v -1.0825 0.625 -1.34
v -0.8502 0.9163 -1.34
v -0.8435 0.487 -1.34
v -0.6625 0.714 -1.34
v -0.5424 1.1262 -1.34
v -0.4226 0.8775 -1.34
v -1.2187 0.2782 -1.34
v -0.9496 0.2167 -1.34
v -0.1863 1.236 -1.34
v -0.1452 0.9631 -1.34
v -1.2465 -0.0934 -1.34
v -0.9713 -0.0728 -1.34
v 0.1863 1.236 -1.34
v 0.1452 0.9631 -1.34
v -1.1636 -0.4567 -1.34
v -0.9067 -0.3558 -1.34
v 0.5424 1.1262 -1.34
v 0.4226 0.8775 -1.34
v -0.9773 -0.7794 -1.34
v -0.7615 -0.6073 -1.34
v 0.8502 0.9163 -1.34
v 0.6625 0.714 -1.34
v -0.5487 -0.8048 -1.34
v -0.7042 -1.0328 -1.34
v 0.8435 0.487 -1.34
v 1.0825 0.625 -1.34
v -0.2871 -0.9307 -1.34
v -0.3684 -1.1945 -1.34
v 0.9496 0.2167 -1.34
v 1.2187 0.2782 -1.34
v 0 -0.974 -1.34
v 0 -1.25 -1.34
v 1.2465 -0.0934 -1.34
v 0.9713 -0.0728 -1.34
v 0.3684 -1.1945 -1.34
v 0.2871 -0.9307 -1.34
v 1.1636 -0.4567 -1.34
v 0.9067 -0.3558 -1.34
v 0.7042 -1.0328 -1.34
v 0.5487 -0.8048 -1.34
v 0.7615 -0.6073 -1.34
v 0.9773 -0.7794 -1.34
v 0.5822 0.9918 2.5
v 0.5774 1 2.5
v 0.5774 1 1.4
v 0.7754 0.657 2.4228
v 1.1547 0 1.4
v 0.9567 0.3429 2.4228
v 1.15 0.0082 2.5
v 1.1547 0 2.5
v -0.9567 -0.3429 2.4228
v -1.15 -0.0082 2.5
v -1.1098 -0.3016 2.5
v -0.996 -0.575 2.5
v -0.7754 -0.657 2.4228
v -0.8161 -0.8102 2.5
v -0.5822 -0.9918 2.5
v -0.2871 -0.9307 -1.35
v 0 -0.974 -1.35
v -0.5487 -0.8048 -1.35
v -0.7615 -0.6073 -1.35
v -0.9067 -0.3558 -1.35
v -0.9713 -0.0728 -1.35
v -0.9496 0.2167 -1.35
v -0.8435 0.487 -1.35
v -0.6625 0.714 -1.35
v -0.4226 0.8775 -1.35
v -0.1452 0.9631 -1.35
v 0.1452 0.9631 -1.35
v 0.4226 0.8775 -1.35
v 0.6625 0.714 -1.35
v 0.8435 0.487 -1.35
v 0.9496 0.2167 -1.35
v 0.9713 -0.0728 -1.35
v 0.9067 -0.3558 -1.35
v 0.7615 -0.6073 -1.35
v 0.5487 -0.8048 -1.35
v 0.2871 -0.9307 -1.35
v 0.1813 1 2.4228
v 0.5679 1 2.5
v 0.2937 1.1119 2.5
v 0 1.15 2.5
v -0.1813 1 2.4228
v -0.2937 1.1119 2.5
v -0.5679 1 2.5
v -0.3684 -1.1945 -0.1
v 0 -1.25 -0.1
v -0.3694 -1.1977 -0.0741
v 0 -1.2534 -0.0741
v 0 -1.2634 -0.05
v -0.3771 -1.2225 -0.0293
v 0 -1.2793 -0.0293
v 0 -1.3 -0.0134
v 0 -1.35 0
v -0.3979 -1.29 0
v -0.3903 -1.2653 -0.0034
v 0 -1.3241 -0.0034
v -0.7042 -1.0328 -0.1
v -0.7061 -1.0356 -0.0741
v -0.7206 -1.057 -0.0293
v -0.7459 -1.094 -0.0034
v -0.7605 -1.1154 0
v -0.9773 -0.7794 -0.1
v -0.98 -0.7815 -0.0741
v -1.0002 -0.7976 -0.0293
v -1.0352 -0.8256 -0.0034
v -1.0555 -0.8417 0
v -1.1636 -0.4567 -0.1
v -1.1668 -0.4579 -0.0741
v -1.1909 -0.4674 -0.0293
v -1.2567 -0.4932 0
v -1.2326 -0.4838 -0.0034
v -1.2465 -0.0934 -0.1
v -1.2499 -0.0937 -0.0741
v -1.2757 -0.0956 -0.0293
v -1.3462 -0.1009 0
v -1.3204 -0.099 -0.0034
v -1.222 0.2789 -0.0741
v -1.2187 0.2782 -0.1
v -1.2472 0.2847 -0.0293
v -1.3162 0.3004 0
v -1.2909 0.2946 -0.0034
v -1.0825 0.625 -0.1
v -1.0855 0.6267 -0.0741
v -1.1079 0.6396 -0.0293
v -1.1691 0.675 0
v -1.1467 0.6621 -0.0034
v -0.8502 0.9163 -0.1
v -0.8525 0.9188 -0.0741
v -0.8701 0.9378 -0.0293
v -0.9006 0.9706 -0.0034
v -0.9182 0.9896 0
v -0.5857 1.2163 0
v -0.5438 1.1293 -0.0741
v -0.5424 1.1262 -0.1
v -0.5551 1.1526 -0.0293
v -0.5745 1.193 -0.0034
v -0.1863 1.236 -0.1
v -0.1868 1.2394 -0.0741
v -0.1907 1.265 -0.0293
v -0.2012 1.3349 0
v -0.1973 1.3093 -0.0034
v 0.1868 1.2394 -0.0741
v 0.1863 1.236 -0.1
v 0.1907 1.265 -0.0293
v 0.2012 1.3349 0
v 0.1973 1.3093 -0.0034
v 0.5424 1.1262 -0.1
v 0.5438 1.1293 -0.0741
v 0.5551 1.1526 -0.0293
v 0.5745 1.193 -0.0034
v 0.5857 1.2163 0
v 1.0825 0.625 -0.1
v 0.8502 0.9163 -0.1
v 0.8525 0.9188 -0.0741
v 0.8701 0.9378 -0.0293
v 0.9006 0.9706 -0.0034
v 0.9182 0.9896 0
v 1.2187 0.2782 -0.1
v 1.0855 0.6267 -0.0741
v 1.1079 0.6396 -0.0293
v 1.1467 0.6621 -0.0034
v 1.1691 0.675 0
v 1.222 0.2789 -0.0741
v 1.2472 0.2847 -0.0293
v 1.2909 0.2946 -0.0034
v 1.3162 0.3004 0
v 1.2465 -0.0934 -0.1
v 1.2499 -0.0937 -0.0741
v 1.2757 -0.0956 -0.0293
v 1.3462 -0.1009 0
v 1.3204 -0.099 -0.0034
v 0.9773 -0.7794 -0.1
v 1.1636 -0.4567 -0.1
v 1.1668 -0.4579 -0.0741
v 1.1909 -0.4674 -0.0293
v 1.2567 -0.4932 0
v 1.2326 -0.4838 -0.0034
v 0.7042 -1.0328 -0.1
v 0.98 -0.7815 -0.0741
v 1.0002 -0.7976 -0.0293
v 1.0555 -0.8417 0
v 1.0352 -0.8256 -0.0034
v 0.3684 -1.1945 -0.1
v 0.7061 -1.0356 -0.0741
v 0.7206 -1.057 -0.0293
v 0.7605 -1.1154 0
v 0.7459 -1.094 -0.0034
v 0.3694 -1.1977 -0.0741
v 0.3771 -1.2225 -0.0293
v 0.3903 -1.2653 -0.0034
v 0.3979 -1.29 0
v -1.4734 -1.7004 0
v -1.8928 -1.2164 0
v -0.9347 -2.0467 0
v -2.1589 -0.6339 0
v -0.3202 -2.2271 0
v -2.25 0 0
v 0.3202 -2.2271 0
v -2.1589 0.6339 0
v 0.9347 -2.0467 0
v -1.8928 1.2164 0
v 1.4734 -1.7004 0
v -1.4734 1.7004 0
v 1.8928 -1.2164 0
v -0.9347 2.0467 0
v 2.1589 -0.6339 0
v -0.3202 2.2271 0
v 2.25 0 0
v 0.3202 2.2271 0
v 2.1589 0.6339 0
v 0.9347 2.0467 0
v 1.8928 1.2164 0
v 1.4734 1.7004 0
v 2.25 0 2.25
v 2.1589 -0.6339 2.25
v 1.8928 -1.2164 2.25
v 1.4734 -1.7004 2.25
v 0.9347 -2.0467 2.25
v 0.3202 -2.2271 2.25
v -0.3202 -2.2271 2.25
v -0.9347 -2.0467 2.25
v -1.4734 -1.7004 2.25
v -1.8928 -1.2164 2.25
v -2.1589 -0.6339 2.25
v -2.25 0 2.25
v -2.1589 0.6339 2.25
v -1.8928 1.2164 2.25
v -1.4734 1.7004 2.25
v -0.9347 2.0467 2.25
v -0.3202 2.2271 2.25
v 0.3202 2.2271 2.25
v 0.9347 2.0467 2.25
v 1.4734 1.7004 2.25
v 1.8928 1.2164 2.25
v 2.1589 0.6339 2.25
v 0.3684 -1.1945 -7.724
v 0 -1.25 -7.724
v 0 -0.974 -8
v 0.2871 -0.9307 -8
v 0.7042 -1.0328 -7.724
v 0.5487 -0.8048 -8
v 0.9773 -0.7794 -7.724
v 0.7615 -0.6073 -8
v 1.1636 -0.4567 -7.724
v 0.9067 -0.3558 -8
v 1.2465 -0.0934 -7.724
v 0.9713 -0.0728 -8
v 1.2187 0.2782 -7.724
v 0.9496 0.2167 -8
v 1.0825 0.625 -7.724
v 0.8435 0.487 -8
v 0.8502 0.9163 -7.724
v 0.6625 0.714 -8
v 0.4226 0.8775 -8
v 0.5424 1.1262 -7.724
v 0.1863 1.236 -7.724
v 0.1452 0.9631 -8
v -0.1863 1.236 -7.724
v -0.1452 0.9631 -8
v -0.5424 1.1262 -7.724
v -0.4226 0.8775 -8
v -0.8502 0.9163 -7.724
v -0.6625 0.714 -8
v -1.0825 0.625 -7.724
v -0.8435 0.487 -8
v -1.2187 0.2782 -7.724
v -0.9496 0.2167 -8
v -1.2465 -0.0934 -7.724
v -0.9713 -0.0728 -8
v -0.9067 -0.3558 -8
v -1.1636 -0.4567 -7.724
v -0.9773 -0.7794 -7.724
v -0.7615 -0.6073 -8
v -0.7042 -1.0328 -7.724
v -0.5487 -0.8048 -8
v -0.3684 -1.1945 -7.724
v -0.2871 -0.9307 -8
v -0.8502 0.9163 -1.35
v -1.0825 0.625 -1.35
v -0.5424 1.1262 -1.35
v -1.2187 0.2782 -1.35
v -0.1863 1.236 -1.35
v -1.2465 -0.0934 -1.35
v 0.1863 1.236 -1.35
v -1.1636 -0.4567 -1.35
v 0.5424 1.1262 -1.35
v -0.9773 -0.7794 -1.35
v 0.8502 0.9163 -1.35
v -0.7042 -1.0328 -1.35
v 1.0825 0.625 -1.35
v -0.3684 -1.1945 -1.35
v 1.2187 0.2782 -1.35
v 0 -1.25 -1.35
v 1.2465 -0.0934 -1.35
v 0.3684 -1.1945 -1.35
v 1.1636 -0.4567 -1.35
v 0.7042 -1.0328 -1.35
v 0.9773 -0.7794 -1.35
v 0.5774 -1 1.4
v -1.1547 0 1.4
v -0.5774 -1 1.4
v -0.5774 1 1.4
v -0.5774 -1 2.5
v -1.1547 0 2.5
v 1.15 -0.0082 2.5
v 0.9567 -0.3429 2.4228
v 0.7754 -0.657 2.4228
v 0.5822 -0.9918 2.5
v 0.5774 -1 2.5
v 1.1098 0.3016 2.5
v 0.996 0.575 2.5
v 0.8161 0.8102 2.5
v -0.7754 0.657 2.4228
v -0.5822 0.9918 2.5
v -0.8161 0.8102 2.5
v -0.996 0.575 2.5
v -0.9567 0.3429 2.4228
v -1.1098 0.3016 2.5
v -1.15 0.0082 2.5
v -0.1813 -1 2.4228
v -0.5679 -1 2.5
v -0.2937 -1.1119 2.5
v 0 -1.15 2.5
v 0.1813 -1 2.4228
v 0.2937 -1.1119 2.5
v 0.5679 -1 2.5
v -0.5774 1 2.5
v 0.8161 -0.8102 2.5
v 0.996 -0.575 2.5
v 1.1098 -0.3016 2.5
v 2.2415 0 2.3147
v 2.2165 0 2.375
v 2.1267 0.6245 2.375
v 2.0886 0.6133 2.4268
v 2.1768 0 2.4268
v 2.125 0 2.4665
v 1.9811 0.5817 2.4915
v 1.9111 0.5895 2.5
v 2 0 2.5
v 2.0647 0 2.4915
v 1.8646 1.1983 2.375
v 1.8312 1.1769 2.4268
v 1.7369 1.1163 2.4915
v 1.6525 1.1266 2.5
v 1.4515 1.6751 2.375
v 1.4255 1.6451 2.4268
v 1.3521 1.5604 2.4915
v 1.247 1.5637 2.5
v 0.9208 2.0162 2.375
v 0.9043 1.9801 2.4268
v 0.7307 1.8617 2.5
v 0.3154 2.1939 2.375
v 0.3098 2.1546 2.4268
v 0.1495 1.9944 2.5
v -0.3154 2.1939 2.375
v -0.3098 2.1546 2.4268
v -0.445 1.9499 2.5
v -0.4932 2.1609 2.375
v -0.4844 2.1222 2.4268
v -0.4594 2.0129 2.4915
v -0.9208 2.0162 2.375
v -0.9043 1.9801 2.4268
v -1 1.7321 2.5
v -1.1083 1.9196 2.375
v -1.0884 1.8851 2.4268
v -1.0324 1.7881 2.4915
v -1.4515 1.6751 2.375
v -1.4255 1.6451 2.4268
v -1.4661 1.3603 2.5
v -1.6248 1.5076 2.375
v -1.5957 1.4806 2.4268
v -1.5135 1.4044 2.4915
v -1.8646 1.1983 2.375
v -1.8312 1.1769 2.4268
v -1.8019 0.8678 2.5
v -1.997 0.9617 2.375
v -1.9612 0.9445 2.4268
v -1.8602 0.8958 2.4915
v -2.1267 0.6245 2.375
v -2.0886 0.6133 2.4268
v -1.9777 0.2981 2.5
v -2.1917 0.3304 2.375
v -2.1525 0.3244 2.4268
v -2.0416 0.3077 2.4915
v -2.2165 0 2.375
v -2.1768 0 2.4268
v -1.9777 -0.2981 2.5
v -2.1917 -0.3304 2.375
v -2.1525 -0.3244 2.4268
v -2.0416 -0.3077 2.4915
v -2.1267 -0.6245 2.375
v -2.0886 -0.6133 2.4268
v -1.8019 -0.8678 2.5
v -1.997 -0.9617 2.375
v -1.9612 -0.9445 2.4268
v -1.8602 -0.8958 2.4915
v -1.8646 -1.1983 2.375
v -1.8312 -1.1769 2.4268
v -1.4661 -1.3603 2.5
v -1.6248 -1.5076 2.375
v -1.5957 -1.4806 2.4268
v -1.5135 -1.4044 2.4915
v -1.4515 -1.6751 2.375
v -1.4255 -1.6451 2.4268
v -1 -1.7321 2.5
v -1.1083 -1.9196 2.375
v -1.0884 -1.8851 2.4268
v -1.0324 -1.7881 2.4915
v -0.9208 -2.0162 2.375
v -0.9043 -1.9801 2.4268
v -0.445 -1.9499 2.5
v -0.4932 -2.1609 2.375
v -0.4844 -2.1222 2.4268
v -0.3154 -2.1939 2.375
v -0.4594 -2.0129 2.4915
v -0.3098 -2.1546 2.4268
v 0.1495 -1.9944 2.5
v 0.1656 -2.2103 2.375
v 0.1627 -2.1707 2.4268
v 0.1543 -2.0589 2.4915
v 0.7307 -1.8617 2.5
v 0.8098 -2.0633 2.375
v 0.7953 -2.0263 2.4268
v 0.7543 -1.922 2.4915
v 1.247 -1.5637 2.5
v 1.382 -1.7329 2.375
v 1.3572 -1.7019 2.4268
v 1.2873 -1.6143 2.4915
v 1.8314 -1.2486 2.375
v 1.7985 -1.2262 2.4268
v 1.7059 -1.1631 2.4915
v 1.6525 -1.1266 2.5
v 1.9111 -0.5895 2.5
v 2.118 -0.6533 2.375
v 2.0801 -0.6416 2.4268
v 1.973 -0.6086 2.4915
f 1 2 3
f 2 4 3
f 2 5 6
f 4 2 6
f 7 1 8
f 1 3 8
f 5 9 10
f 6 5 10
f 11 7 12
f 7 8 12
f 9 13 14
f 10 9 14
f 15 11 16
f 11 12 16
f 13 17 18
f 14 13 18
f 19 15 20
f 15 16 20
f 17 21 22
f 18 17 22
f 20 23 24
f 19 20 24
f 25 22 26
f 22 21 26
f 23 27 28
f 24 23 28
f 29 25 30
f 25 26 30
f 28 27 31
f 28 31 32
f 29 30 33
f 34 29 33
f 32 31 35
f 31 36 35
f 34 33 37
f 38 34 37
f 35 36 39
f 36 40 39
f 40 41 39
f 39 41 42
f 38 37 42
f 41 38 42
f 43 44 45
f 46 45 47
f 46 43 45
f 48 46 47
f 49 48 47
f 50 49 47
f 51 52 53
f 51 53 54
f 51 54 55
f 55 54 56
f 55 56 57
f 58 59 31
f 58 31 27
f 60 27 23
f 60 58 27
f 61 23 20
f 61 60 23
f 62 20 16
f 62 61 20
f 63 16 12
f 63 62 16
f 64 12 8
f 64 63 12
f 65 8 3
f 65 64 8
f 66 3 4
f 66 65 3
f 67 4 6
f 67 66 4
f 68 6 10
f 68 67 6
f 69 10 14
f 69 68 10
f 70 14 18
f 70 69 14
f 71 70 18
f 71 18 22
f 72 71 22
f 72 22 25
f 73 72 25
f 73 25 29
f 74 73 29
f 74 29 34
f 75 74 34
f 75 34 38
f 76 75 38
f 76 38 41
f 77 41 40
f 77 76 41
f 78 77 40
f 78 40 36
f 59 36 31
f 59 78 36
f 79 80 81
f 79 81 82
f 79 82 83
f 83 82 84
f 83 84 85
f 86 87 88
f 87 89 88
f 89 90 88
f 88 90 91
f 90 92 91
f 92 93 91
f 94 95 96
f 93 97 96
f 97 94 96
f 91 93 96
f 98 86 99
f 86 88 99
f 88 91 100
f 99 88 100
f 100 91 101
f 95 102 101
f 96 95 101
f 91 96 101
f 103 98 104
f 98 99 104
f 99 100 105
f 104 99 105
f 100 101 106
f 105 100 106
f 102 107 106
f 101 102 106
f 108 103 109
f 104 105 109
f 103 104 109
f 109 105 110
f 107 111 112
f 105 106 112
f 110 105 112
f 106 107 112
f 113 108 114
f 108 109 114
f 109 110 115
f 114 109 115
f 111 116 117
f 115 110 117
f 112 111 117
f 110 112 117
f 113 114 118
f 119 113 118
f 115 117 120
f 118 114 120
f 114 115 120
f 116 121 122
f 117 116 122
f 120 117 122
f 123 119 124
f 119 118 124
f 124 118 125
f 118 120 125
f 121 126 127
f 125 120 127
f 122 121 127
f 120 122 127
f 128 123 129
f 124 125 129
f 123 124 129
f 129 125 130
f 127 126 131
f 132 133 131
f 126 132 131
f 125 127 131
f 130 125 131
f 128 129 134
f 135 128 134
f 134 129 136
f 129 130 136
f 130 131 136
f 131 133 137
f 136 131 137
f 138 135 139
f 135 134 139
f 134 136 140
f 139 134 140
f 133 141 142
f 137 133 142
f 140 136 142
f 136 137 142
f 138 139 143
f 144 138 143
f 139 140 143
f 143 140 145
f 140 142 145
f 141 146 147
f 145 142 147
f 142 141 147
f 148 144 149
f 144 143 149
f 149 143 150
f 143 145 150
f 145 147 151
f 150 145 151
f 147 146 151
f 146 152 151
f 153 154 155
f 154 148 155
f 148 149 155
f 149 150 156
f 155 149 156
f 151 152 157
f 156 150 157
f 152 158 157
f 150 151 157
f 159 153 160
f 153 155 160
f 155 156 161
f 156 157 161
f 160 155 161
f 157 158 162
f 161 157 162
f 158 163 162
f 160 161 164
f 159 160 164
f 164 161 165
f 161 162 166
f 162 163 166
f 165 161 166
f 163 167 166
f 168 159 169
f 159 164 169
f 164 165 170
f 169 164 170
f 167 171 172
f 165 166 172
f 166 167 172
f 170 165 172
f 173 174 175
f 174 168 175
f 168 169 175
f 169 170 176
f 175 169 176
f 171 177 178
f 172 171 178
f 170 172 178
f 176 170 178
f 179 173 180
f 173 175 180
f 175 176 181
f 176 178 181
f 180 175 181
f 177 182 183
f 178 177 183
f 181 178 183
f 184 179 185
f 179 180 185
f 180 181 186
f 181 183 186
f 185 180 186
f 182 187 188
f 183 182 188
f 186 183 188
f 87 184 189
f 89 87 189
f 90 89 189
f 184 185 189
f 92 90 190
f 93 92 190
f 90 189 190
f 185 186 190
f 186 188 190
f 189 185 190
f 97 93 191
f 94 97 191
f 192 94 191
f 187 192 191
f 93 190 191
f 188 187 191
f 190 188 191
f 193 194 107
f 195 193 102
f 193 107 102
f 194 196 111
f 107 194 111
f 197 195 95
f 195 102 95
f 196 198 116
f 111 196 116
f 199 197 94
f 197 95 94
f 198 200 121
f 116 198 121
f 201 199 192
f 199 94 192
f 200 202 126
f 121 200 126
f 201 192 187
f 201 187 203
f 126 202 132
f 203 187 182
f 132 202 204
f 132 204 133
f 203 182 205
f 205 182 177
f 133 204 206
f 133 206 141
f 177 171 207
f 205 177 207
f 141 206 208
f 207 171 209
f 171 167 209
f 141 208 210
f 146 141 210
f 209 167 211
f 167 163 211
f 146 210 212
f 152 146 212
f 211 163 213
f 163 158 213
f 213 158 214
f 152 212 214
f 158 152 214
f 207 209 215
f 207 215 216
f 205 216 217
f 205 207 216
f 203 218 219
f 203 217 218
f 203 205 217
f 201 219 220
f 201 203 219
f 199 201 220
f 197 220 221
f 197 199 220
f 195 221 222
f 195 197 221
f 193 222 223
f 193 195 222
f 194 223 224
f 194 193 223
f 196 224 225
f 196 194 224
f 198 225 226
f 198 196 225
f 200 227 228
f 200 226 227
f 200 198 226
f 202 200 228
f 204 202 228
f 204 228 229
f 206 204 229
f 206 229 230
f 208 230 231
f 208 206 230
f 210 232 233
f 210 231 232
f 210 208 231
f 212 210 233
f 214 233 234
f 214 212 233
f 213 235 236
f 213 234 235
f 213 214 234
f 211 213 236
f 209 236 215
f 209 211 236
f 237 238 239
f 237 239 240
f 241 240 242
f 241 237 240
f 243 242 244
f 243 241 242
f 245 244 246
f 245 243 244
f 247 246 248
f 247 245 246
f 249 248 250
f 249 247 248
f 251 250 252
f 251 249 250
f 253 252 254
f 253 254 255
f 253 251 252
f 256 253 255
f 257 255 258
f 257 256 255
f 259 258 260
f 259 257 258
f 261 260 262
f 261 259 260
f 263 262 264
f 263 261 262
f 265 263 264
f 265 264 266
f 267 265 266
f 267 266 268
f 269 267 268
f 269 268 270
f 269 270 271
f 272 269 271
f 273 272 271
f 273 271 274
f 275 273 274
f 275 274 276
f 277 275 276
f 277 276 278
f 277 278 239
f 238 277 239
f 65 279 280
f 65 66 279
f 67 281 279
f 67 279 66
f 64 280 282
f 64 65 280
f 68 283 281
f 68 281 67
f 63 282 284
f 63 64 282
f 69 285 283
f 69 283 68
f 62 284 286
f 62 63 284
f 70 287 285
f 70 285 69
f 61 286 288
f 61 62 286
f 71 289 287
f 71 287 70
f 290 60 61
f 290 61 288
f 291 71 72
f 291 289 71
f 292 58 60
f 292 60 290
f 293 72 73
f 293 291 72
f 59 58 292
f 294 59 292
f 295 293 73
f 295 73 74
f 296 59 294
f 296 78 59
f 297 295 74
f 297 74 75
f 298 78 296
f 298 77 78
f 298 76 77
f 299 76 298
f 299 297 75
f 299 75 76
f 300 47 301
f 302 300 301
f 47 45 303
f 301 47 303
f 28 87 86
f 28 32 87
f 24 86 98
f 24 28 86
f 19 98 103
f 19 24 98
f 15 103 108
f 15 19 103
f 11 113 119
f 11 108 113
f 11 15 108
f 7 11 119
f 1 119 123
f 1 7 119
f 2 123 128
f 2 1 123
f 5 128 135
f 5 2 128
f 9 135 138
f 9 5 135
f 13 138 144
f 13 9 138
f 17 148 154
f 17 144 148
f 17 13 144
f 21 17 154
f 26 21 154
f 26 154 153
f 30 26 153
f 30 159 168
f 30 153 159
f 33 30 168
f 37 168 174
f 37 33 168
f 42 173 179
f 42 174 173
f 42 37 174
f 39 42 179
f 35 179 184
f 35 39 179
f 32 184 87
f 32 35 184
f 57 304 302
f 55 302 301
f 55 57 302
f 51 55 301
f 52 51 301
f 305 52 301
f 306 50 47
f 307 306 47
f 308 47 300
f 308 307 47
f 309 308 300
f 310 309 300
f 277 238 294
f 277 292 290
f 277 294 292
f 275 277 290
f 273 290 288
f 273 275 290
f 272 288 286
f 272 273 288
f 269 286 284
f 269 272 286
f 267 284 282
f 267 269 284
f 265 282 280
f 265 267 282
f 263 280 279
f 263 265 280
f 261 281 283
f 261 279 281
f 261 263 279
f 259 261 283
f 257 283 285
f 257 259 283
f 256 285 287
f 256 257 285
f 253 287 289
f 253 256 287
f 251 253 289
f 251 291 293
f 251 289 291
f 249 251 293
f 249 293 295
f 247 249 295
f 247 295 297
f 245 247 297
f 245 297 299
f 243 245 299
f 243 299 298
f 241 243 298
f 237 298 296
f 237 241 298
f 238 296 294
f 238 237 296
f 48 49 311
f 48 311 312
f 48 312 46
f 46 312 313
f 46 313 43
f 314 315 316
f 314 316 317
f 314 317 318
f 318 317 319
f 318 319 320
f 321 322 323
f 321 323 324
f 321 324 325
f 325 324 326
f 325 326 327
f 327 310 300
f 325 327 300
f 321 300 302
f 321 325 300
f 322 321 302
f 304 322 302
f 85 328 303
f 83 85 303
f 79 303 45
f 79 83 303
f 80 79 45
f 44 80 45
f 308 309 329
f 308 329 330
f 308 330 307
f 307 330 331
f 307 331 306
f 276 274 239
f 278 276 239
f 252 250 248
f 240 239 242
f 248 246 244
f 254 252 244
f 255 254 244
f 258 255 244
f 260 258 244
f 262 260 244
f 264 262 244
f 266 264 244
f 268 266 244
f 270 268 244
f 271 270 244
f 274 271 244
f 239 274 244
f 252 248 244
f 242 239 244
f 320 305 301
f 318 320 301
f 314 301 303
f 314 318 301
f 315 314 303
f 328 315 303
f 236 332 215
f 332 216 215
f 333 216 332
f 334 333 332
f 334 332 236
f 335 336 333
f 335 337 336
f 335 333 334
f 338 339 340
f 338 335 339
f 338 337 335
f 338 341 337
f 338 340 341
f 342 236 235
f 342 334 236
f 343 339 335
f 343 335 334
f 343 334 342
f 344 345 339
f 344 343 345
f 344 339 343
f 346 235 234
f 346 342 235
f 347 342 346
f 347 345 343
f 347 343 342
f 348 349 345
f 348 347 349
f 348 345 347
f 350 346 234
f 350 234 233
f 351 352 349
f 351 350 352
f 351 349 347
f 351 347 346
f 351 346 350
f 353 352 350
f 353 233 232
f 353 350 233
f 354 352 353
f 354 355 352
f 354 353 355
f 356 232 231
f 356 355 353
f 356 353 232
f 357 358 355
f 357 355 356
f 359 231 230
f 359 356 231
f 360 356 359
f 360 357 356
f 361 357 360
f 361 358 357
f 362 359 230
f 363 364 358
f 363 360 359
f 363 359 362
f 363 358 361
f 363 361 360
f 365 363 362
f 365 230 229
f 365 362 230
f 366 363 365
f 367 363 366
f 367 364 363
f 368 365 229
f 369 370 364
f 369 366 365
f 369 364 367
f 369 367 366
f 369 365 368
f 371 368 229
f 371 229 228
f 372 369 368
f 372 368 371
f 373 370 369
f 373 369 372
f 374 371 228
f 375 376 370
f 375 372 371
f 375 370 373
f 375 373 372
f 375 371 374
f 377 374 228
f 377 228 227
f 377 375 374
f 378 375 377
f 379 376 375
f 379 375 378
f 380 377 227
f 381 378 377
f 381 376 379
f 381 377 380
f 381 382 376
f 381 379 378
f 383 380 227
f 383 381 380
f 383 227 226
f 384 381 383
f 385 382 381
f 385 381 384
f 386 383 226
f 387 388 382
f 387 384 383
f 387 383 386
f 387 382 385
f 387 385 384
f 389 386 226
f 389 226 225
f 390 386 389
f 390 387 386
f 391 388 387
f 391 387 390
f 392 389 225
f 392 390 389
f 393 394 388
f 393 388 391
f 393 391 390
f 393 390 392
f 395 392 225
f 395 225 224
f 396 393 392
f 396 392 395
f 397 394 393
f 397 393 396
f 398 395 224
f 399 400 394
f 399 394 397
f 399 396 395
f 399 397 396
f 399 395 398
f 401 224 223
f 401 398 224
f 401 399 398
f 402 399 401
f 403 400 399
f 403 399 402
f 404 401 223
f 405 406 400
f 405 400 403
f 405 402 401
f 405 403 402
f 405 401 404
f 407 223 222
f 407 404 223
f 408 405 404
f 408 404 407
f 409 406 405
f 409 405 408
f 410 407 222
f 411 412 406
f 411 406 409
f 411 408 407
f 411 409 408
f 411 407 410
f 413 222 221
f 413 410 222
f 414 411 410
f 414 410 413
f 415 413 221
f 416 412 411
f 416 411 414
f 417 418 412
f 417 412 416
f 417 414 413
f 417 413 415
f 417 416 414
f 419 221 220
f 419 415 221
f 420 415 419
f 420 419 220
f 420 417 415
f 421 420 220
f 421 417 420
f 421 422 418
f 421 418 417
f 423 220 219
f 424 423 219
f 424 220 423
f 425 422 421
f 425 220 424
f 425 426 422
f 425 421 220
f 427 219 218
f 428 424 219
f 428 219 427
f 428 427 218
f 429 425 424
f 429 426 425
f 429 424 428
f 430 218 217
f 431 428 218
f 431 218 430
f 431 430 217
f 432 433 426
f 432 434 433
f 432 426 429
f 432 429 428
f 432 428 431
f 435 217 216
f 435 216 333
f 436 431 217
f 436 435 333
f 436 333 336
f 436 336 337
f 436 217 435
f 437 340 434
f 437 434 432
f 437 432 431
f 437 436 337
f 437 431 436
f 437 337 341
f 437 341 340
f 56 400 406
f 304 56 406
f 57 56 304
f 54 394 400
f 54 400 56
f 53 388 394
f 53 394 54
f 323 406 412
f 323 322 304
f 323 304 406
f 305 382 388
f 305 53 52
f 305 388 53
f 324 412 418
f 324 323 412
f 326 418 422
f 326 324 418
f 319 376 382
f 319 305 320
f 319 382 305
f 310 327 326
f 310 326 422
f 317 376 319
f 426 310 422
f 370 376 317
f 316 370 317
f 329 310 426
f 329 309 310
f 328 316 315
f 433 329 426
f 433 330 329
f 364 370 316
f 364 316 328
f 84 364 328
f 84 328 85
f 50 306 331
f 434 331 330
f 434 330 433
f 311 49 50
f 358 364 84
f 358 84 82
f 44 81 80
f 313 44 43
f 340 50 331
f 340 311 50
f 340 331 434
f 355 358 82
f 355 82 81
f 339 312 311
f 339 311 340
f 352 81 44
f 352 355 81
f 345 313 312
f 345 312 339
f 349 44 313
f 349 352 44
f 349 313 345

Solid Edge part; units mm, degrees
sketch "Sketch1" plane through (0, 0, 0) normal (0, 0, 1) x (1, 0, 0)
  circle A0 centre (0, 0) radius 2.25
extrude "Protrusion1" add sketch "Sketch1" along normal blind 2.5
sketch "Sketch2" plane through (0, 0, 2.5) normal (0, 0, 1) x (0, 1, 0)
  line L0 (0, 1.1547) -> (1, 0.5774)
  line L1 (1, 0.5774) -> (1, -0.5774)
  line L2 (1, -0.5774) -> (0, -1.1547)
  line L3 (0, -1.1547) -> (-1, -0.5774)
  line L4 (-1, -0.5774) -> (-1, 0.5774)
  line L5 (-1, 0.5774) -> (0, 1.1547)
extrude "Cutout1" cut sketch "Sketch2" against normal blind 1.1
fillet "Round1" radius 0.25 1 edges at (-2.25, 0, 2.5)
sketch "Sketch3" plane through (0, 0, 0) normal (1, 0, 0) x (0, 1, 0)
  line L0 (-0.974, -8) -> (0, -8)
  line L1 (-1.25, -7.724) -> (-0.974, -8)
  line L2 (-1.25, -1.35) -> (-1.25, -7.724)
  line L3 (-0.974, -1.35) -> (-1.25, -1.35)
  line L4 (-0.974, -1.34) -> (-0.974, -1.35)
  line L5 (-1.25, -1.34) -> (-0.974, -1.34)
  line L6 (-1.25, -0.1) -> (-1.25, -1.34)
  arc A0 (-1.25, -0.1) -> (-1.35, 0) centre (-1.35, -0.1) ccw
  dimension "D1" = 1.35
  dimension "D2" = 0.01
  dimension "D3" = 0.1
  dimension "D4" = 8
revolve "RevolvedProtrusion1" add sketch "Sketch3" angle 360 about axis through (0, 0, -60.325) along (0, 0, 1) material side at (0, -0.487, -7.95)
cosmetic_thread "Thread1" size "M2.5"
sketch "Sketch4" plane through (0, 0, 0) normal (0, -1, 0) x (1, 0, 0)
  line L0 (-1.15, 2.5) -> (0, 1.836)
revolve "RevolvedCutout1" cut sketch "Sketch4" angle 360 about axis through (0, 0, 57.15) along (0, 0, -1) material side at (-0.55, 0, 2.2113)
properties material "Stahl"
